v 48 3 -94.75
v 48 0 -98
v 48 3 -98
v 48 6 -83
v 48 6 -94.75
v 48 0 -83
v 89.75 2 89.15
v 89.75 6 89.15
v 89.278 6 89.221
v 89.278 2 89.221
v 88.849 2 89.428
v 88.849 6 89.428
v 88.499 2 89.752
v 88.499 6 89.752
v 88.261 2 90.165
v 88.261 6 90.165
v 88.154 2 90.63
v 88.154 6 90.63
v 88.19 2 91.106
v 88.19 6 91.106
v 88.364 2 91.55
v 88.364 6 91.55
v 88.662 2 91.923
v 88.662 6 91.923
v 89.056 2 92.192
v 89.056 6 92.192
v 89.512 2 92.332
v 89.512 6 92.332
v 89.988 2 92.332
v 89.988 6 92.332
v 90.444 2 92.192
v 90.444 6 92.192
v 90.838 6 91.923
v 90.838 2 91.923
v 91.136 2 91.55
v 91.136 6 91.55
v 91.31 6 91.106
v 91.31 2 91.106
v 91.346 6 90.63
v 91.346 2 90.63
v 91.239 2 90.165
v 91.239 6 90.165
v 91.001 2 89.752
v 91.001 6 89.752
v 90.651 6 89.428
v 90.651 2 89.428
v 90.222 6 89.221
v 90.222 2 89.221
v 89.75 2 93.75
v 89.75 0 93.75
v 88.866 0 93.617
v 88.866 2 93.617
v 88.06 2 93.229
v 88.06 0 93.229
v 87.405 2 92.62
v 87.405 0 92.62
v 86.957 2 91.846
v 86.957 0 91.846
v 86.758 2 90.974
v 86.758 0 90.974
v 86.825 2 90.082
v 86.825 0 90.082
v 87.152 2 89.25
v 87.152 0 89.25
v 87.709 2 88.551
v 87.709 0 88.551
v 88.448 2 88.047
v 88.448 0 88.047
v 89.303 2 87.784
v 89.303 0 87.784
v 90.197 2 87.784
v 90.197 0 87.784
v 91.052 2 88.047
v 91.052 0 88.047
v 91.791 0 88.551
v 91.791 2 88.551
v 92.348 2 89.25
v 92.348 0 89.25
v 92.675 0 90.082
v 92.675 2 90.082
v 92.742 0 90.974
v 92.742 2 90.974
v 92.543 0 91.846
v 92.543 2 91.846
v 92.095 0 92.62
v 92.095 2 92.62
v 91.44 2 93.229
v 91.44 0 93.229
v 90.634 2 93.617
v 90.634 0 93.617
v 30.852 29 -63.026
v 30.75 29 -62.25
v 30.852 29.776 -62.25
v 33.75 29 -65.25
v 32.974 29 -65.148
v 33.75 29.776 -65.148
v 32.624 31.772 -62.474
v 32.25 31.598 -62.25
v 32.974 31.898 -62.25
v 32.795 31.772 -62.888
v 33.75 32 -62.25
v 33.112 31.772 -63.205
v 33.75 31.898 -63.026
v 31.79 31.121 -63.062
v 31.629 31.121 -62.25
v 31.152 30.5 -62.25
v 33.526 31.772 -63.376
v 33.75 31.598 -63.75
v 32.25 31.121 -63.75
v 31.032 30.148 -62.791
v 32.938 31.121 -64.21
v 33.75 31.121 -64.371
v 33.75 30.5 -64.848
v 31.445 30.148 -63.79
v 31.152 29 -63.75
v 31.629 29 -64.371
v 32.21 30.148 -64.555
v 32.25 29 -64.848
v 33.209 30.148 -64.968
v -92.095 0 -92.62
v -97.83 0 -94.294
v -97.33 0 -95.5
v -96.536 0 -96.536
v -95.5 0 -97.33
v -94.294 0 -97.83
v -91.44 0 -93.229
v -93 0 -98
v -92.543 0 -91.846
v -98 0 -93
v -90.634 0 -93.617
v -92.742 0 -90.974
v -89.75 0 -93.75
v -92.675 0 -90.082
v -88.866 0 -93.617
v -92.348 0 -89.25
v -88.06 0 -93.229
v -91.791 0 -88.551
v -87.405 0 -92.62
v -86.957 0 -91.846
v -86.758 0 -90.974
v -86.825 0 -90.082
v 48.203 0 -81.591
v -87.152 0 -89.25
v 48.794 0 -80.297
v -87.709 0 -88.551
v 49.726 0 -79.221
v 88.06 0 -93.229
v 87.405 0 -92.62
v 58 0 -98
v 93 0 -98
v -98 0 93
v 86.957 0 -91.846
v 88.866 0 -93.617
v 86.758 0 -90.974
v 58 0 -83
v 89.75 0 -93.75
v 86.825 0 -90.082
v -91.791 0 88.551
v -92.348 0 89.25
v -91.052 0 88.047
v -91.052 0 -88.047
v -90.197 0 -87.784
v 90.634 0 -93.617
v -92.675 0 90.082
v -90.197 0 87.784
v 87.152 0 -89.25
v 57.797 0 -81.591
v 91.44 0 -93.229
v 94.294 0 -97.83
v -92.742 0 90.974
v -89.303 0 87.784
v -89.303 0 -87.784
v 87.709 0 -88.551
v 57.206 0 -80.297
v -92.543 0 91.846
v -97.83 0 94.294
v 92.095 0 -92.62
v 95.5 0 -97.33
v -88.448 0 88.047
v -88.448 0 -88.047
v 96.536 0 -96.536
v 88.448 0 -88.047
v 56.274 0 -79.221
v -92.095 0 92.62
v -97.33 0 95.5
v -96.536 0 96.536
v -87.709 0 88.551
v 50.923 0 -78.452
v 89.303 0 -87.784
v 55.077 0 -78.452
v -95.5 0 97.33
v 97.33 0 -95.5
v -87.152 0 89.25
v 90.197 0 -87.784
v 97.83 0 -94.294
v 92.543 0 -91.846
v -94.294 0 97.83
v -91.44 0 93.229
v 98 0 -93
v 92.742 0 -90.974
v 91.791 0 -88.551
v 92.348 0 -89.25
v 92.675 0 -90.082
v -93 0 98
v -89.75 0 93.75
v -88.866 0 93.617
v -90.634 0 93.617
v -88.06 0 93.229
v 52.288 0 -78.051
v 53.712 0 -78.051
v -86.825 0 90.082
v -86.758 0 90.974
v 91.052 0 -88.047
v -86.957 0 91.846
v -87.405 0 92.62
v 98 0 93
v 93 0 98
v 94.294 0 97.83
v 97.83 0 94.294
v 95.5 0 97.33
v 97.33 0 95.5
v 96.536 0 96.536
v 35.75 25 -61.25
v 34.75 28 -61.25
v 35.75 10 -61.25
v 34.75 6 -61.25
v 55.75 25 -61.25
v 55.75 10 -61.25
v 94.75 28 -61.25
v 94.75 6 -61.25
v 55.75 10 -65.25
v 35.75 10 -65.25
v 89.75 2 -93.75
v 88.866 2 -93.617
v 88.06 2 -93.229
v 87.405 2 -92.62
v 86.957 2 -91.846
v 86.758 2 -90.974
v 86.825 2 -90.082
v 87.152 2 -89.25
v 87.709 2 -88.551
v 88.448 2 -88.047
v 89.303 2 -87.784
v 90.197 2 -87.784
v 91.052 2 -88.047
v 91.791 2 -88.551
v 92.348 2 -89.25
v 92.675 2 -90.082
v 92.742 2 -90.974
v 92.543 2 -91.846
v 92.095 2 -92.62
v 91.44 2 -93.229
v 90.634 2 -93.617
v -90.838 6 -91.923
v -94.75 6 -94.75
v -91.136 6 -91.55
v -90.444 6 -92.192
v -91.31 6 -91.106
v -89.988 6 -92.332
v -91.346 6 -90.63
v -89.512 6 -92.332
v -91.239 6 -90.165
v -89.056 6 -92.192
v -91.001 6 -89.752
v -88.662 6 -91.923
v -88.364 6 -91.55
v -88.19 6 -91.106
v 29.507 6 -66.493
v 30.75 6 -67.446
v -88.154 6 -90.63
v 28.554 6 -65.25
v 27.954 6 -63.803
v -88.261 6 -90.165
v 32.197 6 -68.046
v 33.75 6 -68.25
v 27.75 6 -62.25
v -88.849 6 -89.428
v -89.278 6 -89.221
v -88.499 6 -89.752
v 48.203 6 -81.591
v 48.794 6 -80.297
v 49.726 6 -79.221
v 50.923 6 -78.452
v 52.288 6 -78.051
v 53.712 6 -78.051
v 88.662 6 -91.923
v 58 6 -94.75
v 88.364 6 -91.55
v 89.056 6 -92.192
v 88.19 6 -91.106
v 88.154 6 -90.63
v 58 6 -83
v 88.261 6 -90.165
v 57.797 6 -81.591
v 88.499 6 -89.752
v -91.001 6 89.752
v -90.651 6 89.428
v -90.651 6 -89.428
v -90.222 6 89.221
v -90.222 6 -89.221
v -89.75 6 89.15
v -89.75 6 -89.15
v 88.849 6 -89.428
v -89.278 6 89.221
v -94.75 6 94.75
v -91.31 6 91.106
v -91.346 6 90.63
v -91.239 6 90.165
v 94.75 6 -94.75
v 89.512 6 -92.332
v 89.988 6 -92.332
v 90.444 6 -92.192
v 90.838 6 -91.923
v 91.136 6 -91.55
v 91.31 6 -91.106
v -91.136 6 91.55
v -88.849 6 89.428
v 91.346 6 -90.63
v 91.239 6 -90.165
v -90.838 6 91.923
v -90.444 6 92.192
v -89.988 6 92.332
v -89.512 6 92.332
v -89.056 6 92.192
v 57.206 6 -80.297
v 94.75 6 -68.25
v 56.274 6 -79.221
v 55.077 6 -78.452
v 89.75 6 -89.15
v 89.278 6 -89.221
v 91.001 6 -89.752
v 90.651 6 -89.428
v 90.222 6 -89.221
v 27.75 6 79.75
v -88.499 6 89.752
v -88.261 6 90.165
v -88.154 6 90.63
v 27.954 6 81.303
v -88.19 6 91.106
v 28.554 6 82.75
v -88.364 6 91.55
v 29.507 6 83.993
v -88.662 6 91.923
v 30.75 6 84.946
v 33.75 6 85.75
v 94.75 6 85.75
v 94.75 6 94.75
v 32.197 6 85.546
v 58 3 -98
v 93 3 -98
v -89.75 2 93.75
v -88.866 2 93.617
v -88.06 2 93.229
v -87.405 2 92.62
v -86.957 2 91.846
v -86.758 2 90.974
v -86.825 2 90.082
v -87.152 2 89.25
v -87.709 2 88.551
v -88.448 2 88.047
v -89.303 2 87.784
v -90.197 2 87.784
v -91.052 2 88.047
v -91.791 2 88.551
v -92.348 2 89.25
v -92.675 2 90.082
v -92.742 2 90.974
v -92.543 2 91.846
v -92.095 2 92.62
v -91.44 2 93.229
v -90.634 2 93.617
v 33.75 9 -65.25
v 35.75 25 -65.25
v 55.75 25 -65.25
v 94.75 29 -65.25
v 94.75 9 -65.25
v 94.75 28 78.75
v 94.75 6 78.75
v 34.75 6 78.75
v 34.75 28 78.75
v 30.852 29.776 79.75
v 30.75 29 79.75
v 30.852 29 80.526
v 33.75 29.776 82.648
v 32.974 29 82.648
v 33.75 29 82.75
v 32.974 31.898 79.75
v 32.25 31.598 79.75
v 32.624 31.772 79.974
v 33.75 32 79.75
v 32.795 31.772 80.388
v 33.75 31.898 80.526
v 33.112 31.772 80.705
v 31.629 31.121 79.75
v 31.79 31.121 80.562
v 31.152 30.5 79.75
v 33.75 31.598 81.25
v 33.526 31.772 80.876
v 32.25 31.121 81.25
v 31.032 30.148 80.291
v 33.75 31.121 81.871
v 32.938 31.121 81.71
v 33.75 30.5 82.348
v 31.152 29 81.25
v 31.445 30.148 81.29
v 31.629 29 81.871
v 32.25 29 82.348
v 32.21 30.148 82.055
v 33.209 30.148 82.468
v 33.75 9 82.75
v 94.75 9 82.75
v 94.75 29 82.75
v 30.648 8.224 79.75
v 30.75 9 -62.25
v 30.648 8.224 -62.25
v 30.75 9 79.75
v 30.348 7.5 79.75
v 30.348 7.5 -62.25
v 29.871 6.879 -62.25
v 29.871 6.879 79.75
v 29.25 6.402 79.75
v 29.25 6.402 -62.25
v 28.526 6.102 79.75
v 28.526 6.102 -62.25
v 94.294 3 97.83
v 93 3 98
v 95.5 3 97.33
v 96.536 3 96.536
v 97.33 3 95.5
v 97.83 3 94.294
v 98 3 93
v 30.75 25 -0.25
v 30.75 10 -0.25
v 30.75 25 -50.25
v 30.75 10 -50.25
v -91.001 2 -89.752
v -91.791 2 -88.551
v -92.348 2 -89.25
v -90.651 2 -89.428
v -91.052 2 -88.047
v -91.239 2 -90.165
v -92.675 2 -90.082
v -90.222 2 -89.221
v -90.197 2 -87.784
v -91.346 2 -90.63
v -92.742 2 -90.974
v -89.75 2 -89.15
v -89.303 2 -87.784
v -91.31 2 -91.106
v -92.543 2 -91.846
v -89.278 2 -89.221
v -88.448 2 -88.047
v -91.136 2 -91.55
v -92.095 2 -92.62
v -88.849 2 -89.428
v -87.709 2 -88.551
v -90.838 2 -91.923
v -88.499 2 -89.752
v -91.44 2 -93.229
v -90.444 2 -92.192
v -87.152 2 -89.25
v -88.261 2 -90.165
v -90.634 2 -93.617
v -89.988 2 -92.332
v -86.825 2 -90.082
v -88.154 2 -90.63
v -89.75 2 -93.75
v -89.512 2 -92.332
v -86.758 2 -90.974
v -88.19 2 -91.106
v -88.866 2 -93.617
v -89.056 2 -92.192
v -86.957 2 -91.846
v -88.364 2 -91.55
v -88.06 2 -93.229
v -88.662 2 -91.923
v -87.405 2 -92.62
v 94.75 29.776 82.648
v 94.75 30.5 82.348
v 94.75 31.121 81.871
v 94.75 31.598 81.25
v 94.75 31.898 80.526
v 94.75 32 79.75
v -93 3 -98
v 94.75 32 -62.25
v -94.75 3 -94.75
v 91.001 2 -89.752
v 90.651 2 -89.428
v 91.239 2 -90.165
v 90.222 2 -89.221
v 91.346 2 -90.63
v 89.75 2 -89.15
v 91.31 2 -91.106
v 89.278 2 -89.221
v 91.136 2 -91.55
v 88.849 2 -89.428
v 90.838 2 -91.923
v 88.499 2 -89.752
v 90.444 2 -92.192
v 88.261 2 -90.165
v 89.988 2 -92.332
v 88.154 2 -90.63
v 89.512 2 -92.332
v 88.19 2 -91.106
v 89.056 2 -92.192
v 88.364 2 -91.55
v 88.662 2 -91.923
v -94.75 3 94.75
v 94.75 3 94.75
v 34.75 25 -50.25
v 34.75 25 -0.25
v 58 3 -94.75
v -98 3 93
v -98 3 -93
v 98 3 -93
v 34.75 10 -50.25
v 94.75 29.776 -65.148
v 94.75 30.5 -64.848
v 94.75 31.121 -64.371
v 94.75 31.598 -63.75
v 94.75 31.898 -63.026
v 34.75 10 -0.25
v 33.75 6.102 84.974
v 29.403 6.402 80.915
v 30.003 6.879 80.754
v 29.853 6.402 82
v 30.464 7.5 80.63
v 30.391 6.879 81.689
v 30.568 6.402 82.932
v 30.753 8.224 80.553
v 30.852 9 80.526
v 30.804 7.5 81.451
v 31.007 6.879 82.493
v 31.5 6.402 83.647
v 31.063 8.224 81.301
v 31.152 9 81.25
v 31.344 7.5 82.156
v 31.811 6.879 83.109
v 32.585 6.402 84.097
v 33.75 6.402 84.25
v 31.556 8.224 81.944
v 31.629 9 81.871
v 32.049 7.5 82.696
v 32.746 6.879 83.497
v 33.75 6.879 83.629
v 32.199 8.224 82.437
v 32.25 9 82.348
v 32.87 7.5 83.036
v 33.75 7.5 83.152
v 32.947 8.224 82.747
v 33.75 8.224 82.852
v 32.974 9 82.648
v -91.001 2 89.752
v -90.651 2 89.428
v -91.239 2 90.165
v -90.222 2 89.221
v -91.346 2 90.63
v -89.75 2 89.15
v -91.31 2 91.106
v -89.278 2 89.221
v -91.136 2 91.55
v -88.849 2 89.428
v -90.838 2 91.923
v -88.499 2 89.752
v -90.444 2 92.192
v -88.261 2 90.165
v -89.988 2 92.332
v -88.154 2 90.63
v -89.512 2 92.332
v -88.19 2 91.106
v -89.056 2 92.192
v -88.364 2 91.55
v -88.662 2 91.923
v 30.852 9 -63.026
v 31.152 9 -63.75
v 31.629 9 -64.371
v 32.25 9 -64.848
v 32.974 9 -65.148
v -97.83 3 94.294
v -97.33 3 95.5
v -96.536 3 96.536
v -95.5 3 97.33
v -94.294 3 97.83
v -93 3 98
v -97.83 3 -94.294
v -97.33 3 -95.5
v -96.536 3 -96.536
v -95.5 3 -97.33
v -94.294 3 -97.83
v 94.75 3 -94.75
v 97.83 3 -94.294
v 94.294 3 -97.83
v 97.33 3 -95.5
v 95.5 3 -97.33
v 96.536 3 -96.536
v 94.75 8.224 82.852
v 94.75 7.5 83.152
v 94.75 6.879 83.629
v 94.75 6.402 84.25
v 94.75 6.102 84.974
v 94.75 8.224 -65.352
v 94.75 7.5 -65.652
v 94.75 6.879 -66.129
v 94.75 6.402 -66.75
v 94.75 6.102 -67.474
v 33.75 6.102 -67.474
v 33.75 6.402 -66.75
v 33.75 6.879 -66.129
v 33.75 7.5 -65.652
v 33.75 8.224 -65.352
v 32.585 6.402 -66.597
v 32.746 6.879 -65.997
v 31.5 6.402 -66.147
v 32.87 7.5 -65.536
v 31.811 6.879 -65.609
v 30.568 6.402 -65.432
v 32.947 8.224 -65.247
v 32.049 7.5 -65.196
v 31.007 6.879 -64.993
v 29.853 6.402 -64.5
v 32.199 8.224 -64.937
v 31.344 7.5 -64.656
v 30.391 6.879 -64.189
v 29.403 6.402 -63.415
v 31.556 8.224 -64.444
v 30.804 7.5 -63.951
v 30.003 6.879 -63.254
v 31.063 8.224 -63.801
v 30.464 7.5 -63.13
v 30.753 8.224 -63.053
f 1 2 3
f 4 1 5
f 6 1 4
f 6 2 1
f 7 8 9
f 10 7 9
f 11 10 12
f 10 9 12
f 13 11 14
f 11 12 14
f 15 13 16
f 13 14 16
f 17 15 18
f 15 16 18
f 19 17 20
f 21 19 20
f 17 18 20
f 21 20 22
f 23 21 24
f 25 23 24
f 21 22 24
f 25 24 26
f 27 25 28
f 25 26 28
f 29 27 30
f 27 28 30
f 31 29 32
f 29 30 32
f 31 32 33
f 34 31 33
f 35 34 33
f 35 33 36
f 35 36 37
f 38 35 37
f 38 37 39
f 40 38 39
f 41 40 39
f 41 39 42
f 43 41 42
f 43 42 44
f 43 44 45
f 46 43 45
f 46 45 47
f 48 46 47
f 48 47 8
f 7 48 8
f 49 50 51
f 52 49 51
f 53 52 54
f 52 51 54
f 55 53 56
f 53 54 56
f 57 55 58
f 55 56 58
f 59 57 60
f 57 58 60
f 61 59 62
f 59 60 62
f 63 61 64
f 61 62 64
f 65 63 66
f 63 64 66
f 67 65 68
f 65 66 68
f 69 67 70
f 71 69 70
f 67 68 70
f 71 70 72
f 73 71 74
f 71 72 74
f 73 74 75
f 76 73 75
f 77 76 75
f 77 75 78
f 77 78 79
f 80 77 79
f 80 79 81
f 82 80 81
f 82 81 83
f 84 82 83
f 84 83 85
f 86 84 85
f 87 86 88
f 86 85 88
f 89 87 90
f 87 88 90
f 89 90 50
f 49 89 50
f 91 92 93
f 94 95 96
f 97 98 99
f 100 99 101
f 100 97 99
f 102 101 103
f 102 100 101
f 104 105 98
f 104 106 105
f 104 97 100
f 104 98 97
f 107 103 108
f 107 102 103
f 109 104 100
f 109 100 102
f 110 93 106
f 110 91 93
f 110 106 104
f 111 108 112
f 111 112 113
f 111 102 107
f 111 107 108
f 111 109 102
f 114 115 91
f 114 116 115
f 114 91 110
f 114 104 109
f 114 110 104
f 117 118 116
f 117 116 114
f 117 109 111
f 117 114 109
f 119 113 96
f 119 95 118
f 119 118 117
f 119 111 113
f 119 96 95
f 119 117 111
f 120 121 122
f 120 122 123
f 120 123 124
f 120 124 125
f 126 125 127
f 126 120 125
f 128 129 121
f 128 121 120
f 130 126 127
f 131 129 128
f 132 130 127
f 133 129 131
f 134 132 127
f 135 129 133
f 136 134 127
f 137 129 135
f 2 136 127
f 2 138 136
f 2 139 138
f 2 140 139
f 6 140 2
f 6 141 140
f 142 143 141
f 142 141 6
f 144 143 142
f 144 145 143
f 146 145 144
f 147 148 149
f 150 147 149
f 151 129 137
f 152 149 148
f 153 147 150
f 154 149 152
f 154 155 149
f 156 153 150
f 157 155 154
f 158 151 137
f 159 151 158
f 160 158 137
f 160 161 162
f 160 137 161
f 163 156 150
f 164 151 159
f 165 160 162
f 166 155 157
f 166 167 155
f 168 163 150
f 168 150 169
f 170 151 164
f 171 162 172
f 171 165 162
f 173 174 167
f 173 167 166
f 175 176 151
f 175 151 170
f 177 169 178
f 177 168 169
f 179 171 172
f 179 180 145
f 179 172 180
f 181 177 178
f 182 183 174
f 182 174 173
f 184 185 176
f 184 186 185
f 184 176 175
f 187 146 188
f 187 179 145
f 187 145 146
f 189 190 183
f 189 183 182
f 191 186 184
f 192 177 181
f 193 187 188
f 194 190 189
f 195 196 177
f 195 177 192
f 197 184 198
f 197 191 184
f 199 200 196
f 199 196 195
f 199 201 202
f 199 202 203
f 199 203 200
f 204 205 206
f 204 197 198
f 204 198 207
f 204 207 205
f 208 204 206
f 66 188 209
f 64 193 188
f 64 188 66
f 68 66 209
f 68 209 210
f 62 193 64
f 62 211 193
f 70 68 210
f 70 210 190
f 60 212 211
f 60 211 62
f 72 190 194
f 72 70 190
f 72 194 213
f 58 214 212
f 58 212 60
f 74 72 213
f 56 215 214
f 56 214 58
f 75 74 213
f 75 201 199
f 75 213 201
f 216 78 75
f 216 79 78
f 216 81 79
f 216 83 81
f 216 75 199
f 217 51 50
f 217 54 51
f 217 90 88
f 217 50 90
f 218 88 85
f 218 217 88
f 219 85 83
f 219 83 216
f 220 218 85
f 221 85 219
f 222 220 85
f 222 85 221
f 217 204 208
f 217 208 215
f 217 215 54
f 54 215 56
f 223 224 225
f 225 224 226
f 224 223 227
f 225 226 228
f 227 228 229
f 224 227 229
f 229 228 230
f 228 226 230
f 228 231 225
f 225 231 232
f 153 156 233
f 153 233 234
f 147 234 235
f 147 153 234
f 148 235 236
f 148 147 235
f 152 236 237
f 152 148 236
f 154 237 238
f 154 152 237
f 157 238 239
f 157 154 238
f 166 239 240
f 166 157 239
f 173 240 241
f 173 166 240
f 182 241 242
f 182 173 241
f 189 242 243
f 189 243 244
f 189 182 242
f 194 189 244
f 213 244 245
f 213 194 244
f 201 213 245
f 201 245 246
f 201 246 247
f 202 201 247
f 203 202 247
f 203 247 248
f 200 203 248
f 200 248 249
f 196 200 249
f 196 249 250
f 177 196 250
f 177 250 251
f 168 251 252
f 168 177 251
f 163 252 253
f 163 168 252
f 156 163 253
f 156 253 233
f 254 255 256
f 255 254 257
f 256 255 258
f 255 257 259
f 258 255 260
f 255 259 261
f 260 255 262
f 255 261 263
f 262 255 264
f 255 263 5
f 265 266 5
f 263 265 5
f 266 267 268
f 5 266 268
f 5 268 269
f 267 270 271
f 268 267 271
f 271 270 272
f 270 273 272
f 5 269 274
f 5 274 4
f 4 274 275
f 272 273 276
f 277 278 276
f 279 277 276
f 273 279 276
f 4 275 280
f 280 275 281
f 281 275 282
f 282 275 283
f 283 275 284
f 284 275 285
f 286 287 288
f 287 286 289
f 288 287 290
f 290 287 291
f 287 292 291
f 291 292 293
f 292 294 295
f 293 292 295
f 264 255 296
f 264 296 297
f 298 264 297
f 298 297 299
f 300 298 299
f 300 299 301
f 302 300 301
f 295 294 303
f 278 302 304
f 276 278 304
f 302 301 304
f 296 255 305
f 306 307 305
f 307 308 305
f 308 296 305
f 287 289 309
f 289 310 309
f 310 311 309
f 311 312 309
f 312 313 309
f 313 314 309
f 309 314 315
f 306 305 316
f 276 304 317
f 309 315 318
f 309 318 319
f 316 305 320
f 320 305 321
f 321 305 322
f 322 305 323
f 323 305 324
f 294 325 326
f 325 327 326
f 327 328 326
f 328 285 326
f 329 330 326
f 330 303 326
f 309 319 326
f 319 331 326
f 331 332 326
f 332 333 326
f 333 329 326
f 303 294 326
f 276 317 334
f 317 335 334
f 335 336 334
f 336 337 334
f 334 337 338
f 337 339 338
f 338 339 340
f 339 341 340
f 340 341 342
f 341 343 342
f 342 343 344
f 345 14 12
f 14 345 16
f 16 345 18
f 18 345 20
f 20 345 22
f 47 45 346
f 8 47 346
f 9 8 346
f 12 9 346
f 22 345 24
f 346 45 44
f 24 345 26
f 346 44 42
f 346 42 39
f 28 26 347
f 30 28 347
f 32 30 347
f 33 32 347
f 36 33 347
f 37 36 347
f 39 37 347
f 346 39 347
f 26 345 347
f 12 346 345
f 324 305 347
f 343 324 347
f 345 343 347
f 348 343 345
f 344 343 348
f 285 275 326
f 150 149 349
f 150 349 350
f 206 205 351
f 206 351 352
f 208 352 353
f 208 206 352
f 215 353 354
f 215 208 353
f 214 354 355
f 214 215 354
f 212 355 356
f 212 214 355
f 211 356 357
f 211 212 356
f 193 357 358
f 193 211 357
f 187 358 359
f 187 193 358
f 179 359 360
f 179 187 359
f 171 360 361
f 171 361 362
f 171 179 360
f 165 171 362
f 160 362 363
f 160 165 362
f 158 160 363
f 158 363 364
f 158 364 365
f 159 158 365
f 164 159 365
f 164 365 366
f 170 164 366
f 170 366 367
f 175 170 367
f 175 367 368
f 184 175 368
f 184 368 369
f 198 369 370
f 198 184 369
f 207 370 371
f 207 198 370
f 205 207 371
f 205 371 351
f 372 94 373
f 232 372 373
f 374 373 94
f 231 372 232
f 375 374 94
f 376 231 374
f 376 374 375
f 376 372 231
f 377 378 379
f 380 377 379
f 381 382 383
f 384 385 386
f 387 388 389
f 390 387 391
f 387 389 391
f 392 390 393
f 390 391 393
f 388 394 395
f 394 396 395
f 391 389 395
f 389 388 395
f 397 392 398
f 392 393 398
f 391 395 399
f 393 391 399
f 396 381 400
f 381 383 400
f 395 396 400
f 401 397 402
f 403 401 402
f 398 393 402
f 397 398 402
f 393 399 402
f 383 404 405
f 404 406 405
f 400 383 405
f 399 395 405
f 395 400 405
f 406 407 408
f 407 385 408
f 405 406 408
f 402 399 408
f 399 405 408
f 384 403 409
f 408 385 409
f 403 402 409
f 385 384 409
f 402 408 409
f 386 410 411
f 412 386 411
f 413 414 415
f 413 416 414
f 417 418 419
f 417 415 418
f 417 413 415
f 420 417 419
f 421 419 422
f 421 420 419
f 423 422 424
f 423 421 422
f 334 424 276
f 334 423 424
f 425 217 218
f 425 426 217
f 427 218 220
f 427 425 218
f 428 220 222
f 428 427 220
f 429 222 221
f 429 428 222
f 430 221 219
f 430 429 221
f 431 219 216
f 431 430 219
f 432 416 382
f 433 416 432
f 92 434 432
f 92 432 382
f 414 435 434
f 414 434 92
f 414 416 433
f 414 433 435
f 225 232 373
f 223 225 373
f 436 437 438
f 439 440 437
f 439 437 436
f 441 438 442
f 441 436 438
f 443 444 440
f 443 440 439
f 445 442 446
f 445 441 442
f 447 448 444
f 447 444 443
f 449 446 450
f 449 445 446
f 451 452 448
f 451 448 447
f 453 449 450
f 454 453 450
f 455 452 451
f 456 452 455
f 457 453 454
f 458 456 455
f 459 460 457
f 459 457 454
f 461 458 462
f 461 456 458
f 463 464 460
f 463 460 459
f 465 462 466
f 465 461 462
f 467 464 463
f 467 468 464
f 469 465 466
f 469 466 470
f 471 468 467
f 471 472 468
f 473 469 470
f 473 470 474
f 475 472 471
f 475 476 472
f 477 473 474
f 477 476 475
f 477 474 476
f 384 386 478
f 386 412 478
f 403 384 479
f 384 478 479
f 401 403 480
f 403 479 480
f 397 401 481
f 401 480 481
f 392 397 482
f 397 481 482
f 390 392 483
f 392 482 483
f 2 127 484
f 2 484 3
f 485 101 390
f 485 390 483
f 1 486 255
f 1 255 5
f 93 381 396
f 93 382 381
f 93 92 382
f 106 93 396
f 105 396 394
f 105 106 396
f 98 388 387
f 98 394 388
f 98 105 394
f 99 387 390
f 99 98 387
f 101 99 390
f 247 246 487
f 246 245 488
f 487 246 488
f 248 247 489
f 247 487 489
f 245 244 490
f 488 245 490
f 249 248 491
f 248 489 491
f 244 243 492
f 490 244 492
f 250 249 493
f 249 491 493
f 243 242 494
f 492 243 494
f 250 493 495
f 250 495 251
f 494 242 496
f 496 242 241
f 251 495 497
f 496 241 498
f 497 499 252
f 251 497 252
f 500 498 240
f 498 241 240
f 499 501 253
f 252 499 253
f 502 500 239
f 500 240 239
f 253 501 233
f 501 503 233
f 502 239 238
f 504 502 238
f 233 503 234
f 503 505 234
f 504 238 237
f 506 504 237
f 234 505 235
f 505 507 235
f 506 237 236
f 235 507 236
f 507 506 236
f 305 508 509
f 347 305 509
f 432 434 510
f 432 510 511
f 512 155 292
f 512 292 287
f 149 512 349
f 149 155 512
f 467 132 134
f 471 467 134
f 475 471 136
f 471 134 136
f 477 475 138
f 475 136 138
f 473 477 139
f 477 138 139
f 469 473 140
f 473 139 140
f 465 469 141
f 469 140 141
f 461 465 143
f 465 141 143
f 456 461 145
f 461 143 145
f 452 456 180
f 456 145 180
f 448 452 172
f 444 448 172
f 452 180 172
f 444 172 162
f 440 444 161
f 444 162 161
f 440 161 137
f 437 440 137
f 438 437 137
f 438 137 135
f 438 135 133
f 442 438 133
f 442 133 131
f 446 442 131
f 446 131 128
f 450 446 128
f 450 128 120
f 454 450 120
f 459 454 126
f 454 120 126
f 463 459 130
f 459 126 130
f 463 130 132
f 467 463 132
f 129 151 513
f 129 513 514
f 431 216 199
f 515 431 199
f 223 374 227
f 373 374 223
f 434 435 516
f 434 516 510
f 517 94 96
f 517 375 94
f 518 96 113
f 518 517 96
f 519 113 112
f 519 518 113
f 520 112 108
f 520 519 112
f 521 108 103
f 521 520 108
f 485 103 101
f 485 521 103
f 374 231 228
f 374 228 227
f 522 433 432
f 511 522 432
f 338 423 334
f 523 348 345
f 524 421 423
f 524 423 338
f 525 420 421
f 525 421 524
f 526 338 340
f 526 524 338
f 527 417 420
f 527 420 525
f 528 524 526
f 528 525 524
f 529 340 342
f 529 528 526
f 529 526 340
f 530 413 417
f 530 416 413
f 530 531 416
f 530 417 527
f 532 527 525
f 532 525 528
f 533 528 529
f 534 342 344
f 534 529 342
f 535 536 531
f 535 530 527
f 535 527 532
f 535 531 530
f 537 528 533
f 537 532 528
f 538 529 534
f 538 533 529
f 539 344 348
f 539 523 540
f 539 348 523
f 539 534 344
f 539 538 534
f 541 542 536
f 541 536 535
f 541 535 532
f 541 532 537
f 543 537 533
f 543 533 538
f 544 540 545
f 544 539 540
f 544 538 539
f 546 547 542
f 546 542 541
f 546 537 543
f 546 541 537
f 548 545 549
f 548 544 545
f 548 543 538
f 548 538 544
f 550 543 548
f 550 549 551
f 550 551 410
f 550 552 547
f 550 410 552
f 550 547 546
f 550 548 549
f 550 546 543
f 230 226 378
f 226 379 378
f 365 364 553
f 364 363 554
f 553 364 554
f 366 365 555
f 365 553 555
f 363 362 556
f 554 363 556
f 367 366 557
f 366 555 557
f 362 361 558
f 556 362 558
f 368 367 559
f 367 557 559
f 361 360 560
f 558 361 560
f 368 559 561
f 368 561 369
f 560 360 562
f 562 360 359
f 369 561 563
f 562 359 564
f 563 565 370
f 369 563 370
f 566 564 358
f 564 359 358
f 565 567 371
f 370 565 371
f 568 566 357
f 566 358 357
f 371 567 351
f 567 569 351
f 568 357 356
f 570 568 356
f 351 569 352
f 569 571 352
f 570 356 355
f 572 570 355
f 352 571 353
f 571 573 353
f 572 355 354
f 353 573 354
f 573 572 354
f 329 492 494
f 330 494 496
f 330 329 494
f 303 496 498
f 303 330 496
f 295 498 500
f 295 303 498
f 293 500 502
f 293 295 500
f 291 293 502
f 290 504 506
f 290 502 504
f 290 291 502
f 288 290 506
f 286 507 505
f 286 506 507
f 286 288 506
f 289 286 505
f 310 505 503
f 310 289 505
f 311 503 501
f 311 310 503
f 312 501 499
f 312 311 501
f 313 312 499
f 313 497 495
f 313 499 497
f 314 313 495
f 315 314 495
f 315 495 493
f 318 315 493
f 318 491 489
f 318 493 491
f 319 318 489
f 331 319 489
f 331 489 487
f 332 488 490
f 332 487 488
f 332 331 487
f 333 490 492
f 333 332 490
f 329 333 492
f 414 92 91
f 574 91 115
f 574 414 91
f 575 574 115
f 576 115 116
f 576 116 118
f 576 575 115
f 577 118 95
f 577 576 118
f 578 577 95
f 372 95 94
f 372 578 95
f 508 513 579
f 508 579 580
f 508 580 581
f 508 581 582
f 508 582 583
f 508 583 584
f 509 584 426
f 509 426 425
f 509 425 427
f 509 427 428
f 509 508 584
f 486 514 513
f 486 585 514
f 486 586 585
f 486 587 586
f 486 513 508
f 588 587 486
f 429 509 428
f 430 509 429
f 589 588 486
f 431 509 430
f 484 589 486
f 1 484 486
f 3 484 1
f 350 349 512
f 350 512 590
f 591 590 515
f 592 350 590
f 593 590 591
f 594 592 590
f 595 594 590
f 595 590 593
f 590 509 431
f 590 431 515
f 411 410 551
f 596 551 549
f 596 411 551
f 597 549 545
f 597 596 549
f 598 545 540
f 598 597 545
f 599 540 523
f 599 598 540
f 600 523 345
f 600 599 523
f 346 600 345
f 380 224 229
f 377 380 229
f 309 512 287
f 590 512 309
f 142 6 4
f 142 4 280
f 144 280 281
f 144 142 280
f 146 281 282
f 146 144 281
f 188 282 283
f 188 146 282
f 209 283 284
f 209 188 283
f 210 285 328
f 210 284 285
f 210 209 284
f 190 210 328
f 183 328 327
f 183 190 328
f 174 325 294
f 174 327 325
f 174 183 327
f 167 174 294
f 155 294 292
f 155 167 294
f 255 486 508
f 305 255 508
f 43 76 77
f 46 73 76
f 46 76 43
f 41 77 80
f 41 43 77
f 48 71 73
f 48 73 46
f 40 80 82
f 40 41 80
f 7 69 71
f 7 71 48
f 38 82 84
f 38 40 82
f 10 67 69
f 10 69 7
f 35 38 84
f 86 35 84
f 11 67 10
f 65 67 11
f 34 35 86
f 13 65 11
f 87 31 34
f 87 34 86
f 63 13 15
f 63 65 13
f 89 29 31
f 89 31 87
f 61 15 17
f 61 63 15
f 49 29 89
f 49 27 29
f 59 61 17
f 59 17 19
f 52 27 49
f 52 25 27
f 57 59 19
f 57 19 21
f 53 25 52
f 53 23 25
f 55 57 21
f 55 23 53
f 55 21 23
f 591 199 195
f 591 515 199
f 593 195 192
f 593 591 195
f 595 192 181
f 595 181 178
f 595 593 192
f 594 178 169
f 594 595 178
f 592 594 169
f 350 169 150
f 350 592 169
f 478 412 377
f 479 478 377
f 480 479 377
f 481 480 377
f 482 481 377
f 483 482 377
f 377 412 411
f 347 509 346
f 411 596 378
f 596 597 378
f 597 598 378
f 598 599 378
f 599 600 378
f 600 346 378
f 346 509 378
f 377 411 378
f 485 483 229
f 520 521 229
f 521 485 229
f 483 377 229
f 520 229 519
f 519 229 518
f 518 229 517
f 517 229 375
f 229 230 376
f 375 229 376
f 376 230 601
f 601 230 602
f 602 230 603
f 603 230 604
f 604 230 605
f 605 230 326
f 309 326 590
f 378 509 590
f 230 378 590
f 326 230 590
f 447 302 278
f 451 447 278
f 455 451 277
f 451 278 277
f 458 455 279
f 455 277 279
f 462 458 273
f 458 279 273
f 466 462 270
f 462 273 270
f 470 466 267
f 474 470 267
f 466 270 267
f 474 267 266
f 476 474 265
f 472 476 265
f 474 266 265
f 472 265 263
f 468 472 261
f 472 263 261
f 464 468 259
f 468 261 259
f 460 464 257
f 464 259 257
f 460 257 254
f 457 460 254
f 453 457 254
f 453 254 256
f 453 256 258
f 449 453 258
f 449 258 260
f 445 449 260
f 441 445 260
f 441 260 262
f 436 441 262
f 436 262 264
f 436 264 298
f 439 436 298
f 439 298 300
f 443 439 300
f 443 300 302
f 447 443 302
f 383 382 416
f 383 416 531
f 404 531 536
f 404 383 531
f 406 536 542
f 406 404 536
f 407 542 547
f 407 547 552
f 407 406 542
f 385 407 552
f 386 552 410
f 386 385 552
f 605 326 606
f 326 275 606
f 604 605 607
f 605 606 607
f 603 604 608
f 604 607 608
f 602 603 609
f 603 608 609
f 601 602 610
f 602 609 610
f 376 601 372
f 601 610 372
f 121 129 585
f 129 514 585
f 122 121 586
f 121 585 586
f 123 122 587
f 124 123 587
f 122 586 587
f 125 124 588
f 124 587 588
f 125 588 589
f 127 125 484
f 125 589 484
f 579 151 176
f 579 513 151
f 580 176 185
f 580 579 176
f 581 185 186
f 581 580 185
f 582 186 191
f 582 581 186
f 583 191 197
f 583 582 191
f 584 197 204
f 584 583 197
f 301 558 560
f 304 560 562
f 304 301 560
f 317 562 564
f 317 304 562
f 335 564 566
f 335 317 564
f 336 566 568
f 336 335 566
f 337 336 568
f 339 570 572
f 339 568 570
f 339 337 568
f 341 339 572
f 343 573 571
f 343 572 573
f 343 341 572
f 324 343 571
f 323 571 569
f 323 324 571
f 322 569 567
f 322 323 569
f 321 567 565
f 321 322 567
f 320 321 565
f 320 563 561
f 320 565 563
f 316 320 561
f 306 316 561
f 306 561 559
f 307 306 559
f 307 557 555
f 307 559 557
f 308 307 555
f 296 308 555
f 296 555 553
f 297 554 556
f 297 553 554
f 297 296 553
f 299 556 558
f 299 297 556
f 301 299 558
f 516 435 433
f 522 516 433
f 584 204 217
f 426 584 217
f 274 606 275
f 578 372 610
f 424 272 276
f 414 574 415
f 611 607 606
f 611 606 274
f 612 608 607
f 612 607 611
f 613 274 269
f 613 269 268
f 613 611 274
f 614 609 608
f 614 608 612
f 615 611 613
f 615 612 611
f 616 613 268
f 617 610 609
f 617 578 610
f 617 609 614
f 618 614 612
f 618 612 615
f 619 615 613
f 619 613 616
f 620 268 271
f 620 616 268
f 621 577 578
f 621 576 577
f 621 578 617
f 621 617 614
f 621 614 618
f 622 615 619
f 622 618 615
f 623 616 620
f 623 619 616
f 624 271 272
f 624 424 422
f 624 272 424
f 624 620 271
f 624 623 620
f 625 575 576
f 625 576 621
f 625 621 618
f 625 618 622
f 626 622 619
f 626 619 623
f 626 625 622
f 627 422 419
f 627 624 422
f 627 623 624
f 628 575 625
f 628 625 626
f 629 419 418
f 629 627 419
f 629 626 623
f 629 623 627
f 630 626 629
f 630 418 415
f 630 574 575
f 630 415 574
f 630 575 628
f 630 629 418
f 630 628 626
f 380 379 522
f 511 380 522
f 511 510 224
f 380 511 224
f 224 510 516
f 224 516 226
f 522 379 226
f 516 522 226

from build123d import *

# Parameters (mm, degrees)
SKETCH1_W               = 196
SKETCH1_H               = 196
BOSS_EXTRUDE1_DEPTH     = 3
FILLET1_R               = 5
SKETCH2_W               = 189.5
SKETCH2_H               = 189.5
BOSS_EXTRUDE2_DEPTH     = 6
SKETCH3_R               = 1.6
CUT_EXTRUDE1_DEPTH      = 139.722745071
SKETCH5_R               = 3
CUT_EXTRUDE5_DEPTH      = 2
MIRROR2_COPY_1_SKETCH_R = 1.6
MIRROR2_COPY_1_DEPTH    = 139.722745071
MIRROR2_COPY_2_SKETCH_R = 3
MIRROR2_COPY_2_DEPTH    = 2
BOSS_EXTRUDE3_DEPTH     = 22
SKETCH7_W               = 64
SKETCH7_H               = 148
BOSS_EXTRUDE4_DEPTH     = 4
FILLET2_R               = 3
CUT_EXTRUDE6_REACH      = 166.938
SKETCH8_W               = 50
SKETCH8_H               = 15
CUT_EXTRUDE7_REACH      = 195.077
SKETCH10_W              = 20
SKETCH10_H              = 15
CUT_EXTRUDE8_DEPTH      = 143.239235094


with BuildPart() as part:
    # Sketch1 → Boss-Extrude1 (new body)
    with BuildSketch(Plane(origin=(0, 0, 0), x_dir=(1, 0, 0), z_dir=(0, 1, 0))):
        Rectangle(SKETCH1_W, SKETCH1_H)
    extrude(amount=BOSS_EXTRUDE1_DEPTH)

    # Fillet1
    fillet1_edges = [part.edges().sort_by_distance(p)[0] for p in [
        (-98, 1.5, -98),
        (-98, 1.5, 98),
        (98, 1.5, 98),
        (98, 1.5, -98),
    ]]
    fillet(fillet1_edges, radius=FILLET1_R)

    # Sketch2 → Boss-Extrude2 (add)
    with BuildSketch(Plane.XZ):
        Rectangle(SKETCH2_W, SKETCH2_H)
    extrude(amount=-BOSS_EXTRUDE2_DEPTH)

    # Sketch3 → Cut-Extrude1 (cut, through all)
    with BuildSketch(Plane(origin=(0, 6, 0), x_dir=(1, 0, 0), z_dir=(0, 1, 0))):
        with Locations(Location((-89.75, 90.75, 0), (0, 0, 270))):
            Circle(SKETCH3_R)
    cut_extrude1 = extrude(amount=-CUT_EXTRUDE1_DEPTH, mode=Mode.SUBTRACT)

    # Sketch5 → Cut-Extrude5 (cut)
    with BuildSketch(Plane.XZ):
        with Locations(Location((-89.75, -90.75, 0), (0, 0, 270))):
            Circle(SKETCH5_R)
    cut_extrude5 = extrude(amount=-CUT_EXTRUDE5_DEPTH, mode=Mode.SUBTRACT)

    # Mirror1: Cut-Extrude1, Cut-Extrude5 across plane
    add(cut_extrude1.mirror(Plane.XY), mode=Mode.SUBTRACT)
    add(cut_extrude5.mirror(Plane.XY), mode=Mode.SUBTRACT)

    # Mirror2: Cut-Extrude1, Cut-Extrude5 across plane
    add(cut_extrude1.mirror(Plane(origin=(0, 0, 0), x_dir=(0, 0, 1), z_dir=(1, 0, 0))), mode=Mode.SUBTRACT)
    add(cut_extrude5.mirror(Plane(origin=(0, 0, 0), x_dir=(0, 0, 1), z_dir=(1, 0, 0))), mode=Mode.SUBTRACT)

    # Mirror2 copy 1 sketch → Mirror2 copy 1 (cut, through all)
    with BuildSketch(Plane(origin=(0, 6, 0), x_dir=(-1, 0, 0), z_dir=(0, 1, 0))):
        with Locations(Location((-89.75, 90.75, 0), (0, 0, 270))):
            Circle(MIRROR2_COPY_1_SKETCH_R)
    extrude(amount=-MIRROR2_COPY_1_DEPTH, mode=Mode.SUBTRACT)

    # Mirror2 copy 2 sketch → Mirror2 copy 2 (cut)
    with BuildSketch(Plane(origin=(0, 0, 0), x_dir=(-1, 0, 0), z_dir=(0, -1, 0))):
        with Locations(Location((-89.75, -90.75, 0), (0, 0, 270))):
            Circle(MIRROR2_COPY_2_SKETCH_R)
    extrude(amount=-MIRROR2_COPY_2_DEPTH, mode=Mode.SUBTRACT)

    # Sketch6 → Boss-Extrude3 (add)
    with BuildSketch(Plane(origin=(0, 6, 0), x_dir=(1, 0, 0), z_dir=(0, 1, 0))):
        Polygon((94.75, -82.75), (94.75, -78.75), (34.75, -78.75), (34.75, 61.25), (94.75, 61.25), (94.75, 65.25), (30.75, 65.25), (30.75, -82.75), align=None)
    extrude(amount=BOSS_EXTRUDE3_DEPTH)

    # Sketch7 → Boss-Extrude4 (add)
    with BuildSketch(Plane(origin=(0, 28, 0), x_dir=(1, 0, 0), z_dir=(0, 1, 0))):
        with Locations((62.75, -8.75)):
            Rectangle(SKETCH7_W, SKETCH7_H)
    extrude(amount=BOSS_EXTRUDE4_DEPTH)

    # Fillet2
    fillet2_edges = [part.edges().sort_by_distance(p)[0] for p in [
        (62.75, 6, 82.75),
        (30.75, 19, 82.75),
        (62.75, 6, -65.25),
        (30.75, 6, 8.75),
        (30.75, 19, -65.25),
        (30.75, 32, 8.75),
        (62.75, 32, 82.75),
        (62.75, 32, -65.25),
    ]]
    fillet(fillet2_edges, radius=FILLET2_R)

    # Sketch8 → Cut-Extrude6 (cut, up to next)
    with BuildSketch(Plane.ZY.offset(-30.75), mode=Mode.PRIVATE) as cut_extrude6_sk1:
        with Locations((-25.25, 17.5)):
            Rectangle(SKETCH8_W, SKETCH8_H)
    cut_extrude6_tool1 = extrude(cut_extrude6_sk1.sketch, amount=-CUT_EXTRUDE6_REACH, mode=Mode.PRIVATE) & part.part
    add(cut_extrude6_tool1.solids().sort_by_distance((30.75, 17.5, -25.25))[0], mode=Mode.SUBTRACT)

    # Sketch10 → Cut-Extrude7 (cut, up to next)
    with BuildSketch(Plane(origin=(0, 0, -65.25), x_dir=(-1, 0, 0), z_dir=(0, 0, -1)), mode=Mode.PRIVATE) as cut_extrude7_sk1:
        with Locations((-45.75, 17.5)):
            Rectangle(SKETCH10_W, SKETCH10_H)
    cut_extrude7_tool1 = extrude(cut_extrude7_sk1.sketch, amount=-CUT_EXTRUDE7_REACH, mode=Mode.PRIVATE) & part.part
    add(cut_extrude7_tool1.solids().sort_by_distance((45.75, 17.5, -65.25))[0], mode=Mode.SUBTRACT)

    # Sketch11 → Cut-Extrude8 (cut, through all)
    with BuildSketch(Plane.XZ):
        with BuildLine():
            Line((58, -98), (48, -98))
            Line((48, -98), (48, -83))
            ThreePointArc((48, -83), (53, -78), (58, -83))
            Line((58, -83), (58, -98))
        make_face()
    extrude(amount=-CUT_EXTRUDE8_DEPTH, mode=Mode.SUBTRACT)


solid = part.part
